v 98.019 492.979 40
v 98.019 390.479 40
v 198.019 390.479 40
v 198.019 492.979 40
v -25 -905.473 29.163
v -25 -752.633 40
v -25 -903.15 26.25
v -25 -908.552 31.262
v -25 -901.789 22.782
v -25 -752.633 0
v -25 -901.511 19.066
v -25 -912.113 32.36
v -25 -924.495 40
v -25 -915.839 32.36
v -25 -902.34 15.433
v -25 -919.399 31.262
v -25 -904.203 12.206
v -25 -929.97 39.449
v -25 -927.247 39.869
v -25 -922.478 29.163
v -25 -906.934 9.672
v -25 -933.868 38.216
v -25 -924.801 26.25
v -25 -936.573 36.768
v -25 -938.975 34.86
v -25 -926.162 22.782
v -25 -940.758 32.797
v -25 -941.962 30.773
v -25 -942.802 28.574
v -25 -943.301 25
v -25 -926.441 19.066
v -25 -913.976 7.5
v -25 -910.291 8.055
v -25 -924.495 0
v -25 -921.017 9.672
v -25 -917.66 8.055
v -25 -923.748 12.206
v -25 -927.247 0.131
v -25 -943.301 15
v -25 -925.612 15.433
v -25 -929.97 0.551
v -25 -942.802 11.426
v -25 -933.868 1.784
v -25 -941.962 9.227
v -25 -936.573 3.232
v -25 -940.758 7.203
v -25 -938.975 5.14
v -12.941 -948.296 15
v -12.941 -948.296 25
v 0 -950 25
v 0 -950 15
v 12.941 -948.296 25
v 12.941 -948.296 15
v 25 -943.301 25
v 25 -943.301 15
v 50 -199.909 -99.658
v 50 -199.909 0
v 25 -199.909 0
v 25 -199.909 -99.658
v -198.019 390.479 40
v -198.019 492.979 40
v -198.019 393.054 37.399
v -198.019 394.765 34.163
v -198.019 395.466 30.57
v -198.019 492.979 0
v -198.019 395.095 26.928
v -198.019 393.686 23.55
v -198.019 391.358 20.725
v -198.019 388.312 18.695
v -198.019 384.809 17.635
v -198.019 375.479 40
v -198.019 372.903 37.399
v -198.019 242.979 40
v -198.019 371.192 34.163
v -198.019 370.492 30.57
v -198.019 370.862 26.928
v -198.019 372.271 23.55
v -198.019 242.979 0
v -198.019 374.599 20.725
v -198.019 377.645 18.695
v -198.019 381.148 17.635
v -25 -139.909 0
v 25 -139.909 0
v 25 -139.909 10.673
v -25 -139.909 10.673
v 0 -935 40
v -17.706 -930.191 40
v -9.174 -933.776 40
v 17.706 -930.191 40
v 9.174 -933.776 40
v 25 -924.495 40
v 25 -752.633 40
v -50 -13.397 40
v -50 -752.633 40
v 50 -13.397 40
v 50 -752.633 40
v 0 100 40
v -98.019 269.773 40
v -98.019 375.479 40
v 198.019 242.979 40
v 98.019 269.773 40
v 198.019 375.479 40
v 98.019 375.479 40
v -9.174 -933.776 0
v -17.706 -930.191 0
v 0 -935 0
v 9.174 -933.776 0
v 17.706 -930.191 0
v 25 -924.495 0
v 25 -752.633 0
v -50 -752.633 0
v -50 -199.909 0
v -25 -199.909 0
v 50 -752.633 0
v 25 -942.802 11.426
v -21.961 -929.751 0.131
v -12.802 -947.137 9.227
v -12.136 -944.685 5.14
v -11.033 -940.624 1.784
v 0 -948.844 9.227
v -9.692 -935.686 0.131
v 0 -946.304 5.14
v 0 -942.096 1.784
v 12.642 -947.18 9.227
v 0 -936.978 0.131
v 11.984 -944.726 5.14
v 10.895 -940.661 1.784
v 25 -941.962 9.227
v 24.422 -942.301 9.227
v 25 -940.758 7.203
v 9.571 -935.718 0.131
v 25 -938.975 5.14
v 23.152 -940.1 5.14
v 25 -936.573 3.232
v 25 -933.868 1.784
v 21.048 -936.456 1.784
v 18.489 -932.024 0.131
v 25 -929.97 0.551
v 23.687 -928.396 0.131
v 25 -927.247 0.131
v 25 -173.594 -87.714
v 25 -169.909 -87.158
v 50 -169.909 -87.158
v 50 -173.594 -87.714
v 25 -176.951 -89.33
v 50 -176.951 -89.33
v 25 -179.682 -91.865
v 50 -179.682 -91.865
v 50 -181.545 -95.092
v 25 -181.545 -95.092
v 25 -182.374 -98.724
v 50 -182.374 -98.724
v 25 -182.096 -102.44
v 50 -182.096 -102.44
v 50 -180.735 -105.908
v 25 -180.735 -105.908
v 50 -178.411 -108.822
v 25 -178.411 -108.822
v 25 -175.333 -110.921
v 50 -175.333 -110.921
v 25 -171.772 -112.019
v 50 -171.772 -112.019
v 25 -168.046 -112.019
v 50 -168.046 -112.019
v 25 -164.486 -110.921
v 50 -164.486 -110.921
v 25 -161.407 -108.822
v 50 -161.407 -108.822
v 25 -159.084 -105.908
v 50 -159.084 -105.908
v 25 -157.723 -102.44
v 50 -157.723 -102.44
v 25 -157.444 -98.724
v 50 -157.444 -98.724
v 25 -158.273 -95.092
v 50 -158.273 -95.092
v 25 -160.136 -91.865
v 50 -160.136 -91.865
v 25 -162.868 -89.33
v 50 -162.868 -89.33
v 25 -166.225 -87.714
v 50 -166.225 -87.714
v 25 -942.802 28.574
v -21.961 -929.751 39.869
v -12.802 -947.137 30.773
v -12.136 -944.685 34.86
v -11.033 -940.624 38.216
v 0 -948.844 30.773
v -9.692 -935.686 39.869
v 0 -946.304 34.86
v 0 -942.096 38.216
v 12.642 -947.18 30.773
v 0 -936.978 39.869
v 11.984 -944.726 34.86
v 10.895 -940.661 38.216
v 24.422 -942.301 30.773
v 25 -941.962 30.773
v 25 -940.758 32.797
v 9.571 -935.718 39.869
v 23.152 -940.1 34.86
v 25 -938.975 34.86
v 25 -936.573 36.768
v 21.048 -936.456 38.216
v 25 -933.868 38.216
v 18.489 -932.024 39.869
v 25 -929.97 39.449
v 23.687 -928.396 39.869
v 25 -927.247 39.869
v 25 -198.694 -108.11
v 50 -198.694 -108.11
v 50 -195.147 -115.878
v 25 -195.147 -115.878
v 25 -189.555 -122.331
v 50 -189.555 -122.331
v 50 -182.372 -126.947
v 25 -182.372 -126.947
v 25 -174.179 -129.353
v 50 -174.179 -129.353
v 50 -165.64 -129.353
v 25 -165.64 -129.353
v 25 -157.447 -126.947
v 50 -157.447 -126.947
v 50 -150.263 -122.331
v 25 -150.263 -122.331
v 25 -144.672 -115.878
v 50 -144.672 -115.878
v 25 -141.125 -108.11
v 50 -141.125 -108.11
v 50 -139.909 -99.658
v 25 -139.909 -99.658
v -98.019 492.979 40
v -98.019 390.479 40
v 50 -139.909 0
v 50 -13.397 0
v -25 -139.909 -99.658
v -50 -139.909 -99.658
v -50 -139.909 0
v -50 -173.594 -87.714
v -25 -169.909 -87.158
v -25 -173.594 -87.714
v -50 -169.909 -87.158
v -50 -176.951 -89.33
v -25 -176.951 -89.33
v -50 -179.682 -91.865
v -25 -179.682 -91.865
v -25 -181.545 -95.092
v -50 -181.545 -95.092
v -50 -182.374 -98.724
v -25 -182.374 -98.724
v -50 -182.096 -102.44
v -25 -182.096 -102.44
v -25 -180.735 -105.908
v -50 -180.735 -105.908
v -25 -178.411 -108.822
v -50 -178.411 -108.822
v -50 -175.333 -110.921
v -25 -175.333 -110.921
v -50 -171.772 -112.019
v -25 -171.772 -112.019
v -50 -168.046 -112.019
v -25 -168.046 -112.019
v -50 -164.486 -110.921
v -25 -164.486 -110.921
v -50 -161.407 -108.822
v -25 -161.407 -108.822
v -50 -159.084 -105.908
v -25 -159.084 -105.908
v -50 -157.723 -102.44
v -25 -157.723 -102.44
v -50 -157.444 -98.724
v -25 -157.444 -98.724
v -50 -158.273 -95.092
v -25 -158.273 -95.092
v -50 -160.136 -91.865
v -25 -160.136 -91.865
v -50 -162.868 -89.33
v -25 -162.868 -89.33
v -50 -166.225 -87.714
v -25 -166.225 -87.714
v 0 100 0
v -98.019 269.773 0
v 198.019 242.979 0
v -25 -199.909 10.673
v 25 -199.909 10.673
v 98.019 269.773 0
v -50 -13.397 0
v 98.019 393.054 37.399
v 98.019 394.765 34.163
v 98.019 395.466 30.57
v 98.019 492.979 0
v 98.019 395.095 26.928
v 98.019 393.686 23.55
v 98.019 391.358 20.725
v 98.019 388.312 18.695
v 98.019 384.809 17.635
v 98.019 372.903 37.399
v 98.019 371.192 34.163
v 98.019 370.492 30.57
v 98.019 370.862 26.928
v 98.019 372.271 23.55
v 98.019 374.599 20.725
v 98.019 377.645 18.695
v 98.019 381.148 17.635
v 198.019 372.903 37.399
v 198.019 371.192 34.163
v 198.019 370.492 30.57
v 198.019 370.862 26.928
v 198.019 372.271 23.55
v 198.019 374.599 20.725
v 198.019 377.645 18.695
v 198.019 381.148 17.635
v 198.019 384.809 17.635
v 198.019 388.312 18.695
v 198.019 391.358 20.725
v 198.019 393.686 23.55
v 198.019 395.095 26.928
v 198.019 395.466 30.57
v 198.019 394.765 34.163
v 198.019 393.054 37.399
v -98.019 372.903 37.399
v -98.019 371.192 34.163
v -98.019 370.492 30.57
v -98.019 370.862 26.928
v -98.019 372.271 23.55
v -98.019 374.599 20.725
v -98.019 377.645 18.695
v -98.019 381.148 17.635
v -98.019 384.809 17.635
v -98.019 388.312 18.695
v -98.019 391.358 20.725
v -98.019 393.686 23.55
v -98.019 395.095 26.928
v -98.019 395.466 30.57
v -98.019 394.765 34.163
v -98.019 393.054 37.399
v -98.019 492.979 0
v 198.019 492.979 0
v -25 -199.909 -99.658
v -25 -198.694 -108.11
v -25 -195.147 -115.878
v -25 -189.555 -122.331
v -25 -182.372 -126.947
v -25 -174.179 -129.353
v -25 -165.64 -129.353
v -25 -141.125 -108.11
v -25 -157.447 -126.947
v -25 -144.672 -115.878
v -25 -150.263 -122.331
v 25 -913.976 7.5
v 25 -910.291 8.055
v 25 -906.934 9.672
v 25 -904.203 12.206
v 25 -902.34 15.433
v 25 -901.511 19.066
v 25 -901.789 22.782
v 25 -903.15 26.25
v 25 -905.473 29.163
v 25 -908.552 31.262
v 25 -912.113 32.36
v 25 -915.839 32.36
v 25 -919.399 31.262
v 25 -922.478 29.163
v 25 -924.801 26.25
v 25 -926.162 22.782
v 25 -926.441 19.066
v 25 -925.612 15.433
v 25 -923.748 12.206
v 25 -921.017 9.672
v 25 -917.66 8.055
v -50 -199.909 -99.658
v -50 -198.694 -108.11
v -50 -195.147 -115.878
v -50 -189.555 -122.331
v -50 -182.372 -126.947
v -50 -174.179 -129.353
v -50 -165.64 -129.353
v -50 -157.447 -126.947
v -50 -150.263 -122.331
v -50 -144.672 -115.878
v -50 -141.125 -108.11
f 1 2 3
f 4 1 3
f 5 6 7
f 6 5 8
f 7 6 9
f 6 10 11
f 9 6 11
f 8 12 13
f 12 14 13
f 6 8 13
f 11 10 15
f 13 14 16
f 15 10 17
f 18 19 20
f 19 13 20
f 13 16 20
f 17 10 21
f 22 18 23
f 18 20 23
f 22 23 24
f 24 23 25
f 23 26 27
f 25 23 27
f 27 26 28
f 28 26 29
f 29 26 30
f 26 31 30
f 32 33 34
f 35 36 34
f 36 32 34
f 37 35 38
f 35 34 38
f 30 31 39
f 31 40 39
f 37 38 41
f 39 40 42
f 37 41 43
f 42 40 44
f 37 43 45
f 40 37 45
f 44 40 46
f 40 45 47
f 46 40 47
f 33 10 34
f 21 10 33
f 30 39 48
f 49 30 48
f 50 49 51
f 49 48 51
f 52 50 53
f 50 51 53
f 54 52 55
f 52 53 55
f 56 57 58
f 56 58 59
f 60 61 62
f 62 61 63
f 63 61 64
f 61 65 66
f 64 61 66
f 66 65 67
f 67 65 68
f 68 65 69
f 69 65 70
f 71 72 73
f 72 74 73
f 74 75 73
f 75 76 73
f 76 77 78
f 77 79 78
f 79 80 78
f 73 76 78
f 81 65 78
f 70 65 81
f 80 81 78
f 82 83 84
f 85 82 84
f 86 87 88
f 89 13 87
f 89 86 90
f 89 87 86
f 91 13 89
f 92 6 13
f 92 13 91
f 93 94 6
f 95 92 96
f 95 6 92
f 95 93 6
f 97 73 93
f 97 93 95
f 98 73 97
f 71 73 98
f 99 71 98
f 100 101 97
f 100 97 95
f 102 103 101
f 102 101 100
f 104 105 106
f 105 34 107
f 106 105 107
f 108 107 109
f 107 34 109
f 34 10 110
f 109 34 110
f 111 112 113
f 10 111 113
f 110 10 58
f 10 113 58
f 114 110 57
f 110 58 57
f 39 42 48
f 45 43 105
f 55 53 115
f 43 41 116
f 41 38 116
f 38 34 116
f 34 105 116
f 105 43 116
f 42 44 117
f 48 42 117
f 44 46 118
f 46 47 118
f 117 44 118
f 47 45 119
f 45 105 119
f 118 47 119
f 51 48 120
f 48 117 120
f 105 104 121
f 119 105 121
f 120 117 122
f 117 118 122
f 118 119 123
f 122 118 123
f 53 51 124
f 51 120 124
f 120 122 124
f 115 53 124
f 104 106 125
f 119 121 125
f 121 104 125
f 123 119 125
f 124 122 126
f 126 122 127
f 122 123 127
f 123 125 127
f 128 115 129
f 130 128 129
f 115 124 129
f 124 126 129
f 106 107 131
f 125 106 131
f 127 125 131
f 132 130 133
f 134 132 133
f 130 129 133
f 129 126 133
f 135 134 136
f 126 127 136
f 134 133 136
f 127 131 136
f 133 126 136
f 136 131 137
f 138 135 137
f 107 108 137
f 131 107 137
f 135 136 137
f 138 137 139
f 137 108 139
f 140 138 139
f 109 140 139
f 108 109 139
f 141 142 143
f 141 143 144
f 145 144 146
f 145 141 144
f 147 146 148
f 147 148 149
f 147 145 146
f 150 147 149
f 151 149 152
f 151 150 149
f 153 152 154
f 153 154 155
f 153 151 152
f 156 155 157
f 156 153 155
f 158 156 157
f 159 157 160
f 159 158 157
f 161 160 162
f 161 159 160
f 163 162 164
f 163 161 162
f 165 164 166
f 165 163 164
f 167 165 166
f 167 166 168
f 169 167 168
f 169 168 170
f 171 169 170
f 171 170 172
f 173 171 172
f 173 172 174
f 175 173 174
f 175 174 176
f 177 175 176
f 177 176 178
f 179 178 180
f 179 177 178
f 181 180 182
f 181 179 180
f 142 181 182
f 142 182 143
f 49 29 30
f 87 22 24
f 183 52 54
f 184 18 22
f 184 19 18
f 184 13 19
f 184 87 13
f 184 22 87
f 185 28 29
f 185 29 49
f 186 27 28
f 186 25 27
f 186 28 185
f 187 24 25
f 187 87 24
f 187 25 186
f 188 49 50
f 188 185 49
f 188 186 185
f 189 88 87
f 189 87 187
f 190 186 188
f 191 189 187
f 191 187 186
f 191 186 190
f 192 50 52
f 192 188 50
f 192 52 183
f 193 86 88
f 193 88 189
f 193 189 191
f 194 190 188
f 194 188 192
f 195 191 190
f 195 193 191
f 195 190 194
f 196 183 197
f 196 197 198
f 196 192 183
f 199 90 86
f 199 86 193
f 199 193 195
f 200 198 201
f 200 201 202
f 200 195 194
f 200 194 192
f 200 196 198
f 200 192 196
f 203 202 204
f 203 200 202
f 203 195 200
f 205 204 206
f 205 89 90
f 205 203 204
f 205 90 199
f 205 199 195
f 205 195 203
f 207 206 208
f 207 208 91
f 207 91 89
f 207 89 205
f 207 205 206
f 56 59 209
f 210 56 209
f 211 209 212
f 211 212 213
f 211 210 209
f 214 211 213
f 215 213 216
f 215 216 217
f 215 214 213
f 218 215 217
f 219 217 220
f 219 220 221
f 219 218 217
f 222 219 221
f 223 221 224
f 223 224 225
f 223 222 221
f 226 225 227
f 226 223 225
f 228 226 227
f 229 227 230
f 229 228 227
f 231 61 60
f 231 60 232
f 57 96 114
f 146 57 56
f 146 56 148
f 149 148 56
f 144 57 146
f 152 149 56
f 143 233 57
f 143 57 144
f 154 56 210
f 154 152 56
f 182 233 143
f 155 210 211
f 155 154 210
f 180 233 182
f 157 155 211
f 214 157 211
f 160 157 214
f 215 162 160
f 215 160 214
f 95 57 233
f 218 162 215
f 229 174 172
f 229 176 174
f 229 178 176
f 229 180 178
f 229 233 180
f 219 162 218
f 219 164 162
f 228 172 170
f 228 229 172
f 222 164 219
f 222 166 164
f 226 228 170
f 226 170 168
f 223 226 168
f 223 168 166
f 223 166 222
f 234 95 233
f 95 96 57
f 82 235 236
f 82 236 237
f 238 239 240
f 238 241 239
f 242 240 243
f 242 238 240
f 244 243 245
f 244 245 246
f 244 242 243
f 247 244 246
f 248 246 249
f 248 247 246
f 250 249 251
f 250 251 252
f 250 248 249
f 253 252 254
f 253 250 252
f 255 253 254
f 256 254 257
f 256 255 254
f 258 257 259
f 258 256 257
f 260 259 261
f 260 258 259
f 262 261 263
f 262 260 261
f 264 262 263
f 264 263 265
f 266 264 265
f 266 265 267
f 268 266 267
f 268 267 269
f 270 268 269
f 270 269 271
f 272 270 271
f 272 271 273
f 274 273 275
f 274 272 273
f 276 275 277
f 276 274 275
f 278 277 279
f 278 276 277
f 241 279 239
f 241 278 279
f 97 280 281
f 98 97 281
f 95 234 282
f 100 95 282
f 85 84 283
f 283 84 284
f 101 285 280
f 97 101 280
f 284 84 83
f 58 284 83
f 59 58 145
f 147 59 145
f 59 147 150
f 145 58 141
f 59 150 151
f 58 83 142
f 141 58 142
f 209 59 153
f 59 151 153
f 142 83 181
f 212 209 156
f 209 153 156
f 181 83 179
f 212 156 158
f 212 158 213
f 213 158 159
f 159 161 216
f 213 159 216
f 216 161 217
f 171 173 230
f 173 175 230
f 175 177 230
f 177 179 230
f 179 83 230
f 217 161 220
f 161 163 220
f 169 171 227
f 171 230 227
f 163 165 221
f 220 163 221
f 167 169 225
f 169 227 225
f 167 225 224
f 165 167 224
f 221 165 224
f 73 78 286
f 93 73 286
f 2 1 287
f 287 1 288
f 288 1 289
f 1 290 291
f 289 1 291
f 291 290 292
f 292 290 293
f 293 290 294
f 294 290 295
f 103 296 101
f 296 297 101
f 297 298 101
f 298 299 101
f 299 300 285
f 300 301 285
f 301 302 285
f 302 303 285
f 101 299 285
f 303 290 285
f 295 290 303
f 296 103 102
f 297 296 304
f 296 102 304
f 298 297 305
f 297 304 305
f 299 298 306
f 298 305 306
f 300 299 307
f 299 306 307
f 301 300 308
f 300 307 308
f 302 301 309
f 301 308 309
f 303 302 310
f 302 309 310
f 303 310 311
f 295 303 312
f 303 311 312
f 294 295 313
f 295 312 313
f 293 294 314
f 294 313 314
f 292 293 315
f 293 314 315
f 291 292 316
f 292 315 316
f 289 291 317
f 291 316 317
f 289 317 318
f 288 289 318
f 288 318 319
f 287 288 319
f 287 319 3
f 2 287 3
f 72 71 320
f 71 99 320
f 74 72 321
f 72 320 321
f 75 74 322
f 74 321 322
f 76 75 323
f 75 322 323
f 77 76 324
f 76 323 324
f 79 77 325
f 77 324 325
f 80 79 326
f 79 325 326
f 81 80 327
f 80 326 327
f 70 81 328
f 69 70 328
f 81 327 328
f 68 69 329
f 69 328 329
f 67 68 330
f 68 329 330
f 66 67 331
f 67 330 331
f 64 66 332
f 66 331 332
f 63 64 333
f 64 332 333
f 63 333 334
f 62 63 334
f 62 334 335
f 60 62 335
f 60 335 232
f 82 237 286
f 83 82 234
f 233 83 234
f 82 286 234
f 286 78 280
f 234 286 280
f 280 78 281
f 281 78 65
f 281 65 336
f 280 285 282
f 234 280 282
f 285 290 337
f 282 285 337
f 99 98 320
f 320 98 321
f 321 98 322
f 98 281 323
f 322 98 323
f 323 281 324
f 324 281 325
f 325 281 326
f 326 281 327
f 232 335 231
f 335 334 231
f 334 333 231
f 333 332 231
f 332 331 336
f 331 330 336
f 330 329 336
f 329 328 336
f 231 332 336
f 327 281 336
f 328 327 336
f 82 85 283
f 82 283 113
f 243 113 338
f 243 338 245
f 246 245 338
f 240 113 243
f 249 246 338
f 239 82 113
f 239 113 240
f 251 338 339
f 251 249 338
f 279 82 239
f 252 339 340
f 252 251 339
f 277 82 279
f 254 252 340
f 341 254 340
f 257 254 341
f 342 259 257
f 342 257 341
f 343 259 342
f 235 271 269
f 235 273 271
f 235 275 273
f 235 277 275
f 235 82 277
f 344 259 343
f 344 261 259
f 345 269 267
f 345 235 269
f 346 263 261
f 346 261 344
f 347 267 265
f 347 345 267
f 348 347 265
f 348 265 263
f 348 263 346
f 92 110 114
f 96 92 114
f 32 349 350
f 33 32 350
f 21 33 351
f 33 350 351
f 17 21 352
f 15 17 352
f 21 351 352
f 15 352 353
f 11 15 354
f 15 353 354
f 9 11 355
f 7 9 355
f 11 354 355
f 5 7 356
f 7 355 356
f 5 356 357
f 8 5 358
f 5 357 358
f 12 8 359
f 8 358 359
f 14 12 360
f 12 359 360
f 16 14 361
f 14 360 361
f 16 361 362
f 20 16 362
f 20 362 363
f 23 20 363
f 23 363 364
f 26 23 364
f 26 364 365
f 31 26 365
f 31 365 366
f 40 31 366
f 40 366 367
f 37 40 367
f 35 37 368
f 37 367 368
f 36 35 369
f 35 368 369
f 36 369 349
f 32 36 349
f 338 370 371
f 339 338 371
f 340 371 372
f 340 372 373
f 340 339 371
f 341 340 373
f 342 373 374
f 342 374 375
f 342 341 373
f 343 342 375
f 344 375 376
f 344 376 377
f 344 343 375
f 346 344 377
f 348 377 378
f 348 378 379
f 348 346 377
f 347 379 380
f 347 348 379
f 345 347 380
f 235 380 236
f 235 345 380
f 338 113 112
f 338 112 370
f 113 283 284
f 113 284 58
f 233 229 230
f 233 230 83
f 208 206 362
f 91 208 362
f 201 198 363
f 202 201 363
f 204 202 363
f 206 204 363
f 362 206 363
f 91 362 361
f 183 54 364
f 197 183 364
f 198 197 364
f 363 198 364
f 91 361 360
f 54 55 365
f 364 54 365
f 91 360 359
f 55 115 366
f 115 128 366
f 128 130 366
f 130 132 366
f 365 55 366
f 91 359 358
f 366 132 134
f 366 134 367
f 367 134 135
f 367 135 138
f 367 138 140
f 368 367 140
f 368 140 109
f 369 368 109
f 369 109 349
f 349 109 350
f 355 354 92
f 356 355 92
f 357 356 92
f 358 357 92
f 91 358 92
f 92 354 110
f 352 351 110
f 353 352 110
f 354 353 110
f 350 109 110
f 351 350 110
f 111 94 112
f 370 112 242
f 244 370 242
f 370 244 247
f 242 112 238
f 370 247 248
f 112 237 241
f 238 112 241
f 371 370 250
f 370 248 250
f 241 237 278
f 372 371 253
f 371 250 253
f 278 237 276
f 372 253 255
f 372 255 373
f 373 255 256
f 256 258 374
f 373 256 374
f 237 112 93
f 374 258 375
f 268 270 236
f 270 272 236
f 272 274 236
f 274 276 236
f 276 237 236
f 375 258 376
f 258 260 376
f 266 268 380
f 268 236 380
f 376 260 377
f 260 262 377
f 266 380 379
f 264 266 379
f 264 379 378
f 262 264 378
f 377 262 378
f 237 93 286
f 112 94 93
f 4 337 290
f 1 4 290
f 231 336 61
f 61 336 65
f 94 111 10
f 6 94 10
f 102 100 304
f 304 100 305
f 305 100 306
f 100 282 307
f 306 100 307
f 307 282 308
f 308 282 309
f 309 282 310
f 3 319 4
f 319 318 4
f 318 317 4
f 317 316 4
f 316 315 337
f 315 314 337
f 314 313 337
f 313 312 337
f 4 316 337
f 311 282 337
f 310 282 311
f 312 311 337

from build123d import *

# Parameters (mm, degrees)
BOSS_EXTRU_1_DEPTH      = 40
ENL_V_MAT_EXTRU_2_DEPTH = 972.24221049
ESQUISSE3_R             = 12.5
ENL_V_MAT_EXTRU_3_DEPTH = 50
CONG_1_R                = 15
ESQUISSE6_R             = 12.5
BOSS_EXTRU_2_DEPTH      = 50
ENL_V_MAT_EXTRU_4_DEPTH = 25
ESQUISSE7_R             = 12.5
ENL_V_MAT_EXTRU_5_DEPTH = 1038.379889384


with BuildPart() as part:
    # Esquisse1 → Boss.-Extru.1 (new body)
    with BuildSketch(Plane.XY):
        with BuildLine():
            Line((-50, -13.397459622), (-50, -900))
            ThreePointArc((-50, -900), (0, -950), (50, -900))
            Line((50, -900), (50, -13.397459622))
            Line((50, -13.397459622), (43.301270189, -25))
            ThreePointArc((43.301270189, -25), (0, -50), (-43.301270189, -25))
            Line((-43.301270189, -25), (-50, -13.397459622))
        make_face()
        with BuildLine():
            Line((-50, 0), (-50, -13.397459622))
            Line((-50, -13.397459622), (-43.301270189, -25))
            ThreePointArc((-43.301270189, -25), (0, -50), (43.301270189, -25))
            Line((43.301270189, -25), (50, -13.397459622))
            Line((50, -13.397459622), (50, 0))
            ThreePointArc((50, 0), (48.296291314, 12.940952255), (43.301270189, 25))
            ThreePointArc((43.301270189, 25), (0, 50), (-43.301270189, 25))
            ThreePointArc((-43.301270189, 25), (-48.296291314, 12.940952255), (-50, 0))
        make_face()
        with BuildLine():
            Line((-198.018765367, 242.978562467), (-50, -13.397459622))
            Line((-50, -13.397459622), (-50, 0))
            ThreePointArc((-50, 0), (-48.296291314, 12.940952255), (-43.301270189, 25))
            ThreePointArc((-43.301270189, 25), (0, 50), (43.301270189, 25))
            ThreePointArc((43.301270189, 25), (48.296291314, 12.940952255), (50, 0))
            Line((50, 0), (50, -13.397459622))
            Line((50, -13.397459622), (198.018765367, 242.978562467))
            Line((198.018765367, 242.978562467), (198.018765367, 492.978562467))
            Line((198.018765367, 492.978562467), (98.018765367, 492.978562467))
            Line((98.018765367, 492.978562467), (98.018765367, 392.978562467))
            Line((98.018765367, 392.978562467), (98.018765367, 342.978562467))
            Line((98.018765367, 342.978562467), (98.018765367, 269.773481711))
            Line((98.018765367, 269.773481711), (0, 100))
            Line((0, 100), (-98.018765367, 269.773481711))
            Line((-98.018765367, 269.773481711), (-98.018765367, 342.978562467))
            Line((-98.018765367, 342.978562467), (-98.018765367, 392.978562467))
            Line((-98.018765367, 392.978562467), (-98.018765367, 492.978562467))
            Line((-98.018765367, 492.978562467), (-198.018765367, 492.978562467))
            Line((-198.018765367, 492.978562467), (-198.018765367, 242.978562467))
        make_face()
    extrude(amount=BOSS_EXTRU_1_DEPTH)

    # Esquisse2 → Enlèv. mat.-Extru.2 (cut, through all)
    with BuildSketch(Plane(origin=(0, 0, 0), x_dir=(-1, 0, 0), z_dir=(0, 0, -1))):
        with BuildLine():
            ThreePointArc((50, -900), (43.301270189, -925), (25, -943.301270189))
            Line((25, -943.301270189), (25, -1037.943368981))
            Line((25, -1037.943368981), (50, -1037.943368981))
            Line((50, -1037.943368981), (50, -900))
        make_face()
        with BuildLine():
            ThreePointArc((-25, -943.301270189), (-43.301270189, -925), (-50, -900))
            Line((-50, -900), (-50, -1037.943368981))
            Line((-50, -1037.943368981), (-25, -1037.943368981))
            Line((-25, -1037.943368981), (-25, -943.301270189))
        make_face()
        with BuildLine():
            Line((-25, -752.632896004), (-50, -752.632896004))
            Line((-50, -752.632896004), (-50, -900))
            ThreePointArc((-50, -900), (-43.301270189, -925), (-25, -943.301270189))
            Line((-25, -943.301270189), (-25, -752.632896004))
        make_face()
        with BuildLine():
            Line((50, -752.632896004), (25, -752.632896004))
            Line((25, -752.632896004), (25, -943.301270189))
            ThreePointArc((25, -943.301270189), (43.301270189, -925), (50, -900))
            Line((50, -900), (50, -752.632896004))
        make_face()
    extrude(amount=-ENL_V_MAT_EXTRU_2_DEPTH, mode=Mode.SUBTRACT)

    # Esquisse3 → Enlèv. mat.-Extru.3 (cut)
    with BuildSketch(Plane(origin=(25, 0, 0), x_dir=(0, 0, -1), z_dir=(1, 0, 0))):
        with Locations((-20, -913.975598424)):
            Circle(ESQUISSE3_R)
    extrude(amount=-ENL_V_MAT_EXTRU_3_DEPTH, mode=Mode.SUBTRACT)

    # Congé1
    cong_1_edges = [part.edges().sort_by_distance(p)[0] for p in [
        (0, -950, 0),
        (0, -950, 40),
    ]]
    fillet(cong_1_edges, radius=CONG_1_R)

    # Esquisse6 → Boss.-Extru.2 (add, symmetric)
    with BuildSketch(Plane(origin=(0, 0, 0), x_dir=(0, 0, -1), z_dir=(1, 0, 0))):
        with BuildLine():
            Line((99.658431886, -139.909310173), (-10.672864852, -139.909310173))
            Line((-10.672864852, -139.909310173), (-10.672864852, -199.909310173))
            Line((-10.672864852, -199.909310173), (99.658431886, -199.909310173))
            ThreePointArc((99.658431886, -199.909310173), (129.658431886, -169.909310173), (99.658431886, -139.909310173))
        make_face()
        with Locations(Location((99.658431886, -169.909310173, 0), (0, 0, 180))):
            Circle(ESQUISSE6_R, mode=Mode.SUBTRACT)
    extrude(amount=BOSS_EXTRU_2_DEPTH, both=True)

    # Esquisse6 → Enlèv. mat.-Extru.4 (cut, symmetric)
    with BuildSketch(Plane(origin=(0, 0, 0), x_dir=(0, 0, -1), z_dir=(1, 0, 0))):
        with BuildLine():
            Line((99.658431886, -139.909310173), (-10.672864852, -139.909310173))
            Line((-10.672864852, -139.909310173), (-10.672864852, -199.909310173))
            Line((-10.672864852, -199.909310173), (99.658431886, -199.909310173))
            ThreePointArc((99.658431886, -199.909310173), (129.658431886, -169.909310173), (99.658431886, -139.909310173))
        make_face()
        with Locations(Location((99.658431886, -169.909310173, 0), (0, 0, 180))):
            Circle(ESQUISSE6_R, mode=Mode.SUBTRACT)
    extrude(amount=ENL_V_MAT_EXTRU_4_DEPTH, both=True, mode=Mode.SUBTRACT)

    # Esquisse7 → Enlèv. mat.-Extru.5 (cut, through all)
    with BuildSketch(Plane(origin=(198.018765367, 0, 0), x_dir=(0, 0, -1), z_dir=(1, 0, 0))):
        with Locations((-30, 382.978562467)):
            Circle(ESQUISSE7_R)
    extrude(amount=-ENL_V_MAT_EXTRU_5_DEPTH, mode=Mode.SUBTRACT)


solid = part.part
